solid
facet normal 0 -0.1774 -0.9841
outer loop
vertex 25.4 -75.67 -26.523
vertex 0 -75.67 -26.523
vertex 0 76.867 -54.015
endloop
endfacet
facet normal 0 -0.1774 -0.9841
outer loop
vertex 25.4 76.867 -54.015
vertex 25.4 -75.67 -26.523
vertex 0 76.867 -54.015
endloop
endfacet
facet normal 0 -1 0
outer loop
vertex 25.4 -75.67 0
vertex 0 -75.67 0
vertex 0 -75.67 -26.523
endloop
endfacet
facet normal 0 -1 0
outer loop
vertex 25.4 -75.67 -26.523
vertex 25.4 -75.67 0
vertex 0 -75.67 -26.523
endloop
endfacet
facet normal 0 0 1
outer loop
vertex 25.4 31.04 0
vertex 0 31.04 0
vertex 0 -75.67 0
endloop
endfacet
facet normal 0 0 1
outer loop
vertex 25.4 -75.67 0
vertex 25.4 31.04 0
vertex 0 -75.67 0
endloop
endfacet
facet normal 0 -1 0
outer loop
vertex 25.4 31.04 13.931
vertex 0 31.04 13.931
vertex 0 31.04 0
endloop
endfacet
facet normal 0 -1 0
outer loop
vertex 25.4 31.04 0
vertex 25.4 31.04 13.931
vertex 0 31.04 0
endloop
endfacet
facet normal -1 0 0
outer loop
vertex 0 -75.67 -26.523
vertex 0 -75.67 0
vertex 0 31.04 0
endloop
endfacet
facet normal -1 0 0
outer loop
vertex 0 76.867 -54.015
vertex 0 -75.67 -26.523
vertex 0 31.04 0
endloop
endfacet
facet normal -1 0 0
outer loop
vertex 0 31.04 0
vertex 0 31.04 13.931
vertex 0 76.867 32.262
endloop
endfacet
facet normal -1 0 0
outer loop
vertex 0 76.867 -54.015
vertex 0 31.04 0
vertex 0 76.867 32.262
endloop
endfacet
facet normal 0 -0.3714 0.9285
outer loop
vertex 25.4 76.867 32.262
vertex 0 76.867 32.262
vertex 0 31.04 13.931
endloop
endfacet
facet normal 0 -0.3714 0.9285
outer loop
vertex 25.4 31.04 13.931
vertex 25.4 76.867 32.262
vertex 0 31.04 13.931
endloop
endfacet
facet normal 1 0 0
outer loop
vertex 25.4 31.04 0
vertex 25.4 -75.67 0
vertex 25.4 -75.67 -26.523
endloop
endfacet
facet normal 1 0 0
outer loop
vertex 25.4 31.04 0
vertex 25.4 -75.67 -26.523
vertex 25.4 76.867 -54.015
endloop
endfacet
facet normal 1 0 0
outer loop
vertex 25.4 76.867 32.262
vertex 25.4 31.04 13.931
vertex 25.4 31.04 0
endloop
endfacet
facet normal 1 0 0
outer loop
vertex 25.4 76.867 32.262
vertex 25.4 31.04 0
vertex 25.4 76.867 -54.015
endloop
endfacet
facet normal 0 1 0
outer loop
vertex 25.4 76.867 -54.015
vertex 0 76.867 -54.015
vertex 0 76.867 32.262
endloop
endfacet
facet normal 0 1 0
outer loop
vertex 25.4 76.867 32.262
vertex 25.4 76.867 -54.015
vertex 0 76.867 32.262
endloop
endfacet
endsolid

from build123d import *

# Parameters (mm, degrees)
F1_DEPTH = 25.4


with BuildPart() as f1:
    # F0 (on Right) → F1 (new body)
    with BuildSketch(Plane.YZ):
        Polygon((16.642717, 0), (-75.669996, 0), (-75.669996, -26.522875), (76.867461, -54.014966), (76.867461, -26.522875), (31.040281, 0), (25.836868, 0), (29.329389, -22.730291), align=None)
        Polygon((25.836868, 0), (16.642717, 0), (29.329389, -22.730291), align=None)
        Polygon((31.040281, 13.931453), (31.040281, 0), (76.867461, -26.522875), (76.867461, 32.262325), align=None)
    extrude(amount=F1_DEPTH)


solid = f1.part
